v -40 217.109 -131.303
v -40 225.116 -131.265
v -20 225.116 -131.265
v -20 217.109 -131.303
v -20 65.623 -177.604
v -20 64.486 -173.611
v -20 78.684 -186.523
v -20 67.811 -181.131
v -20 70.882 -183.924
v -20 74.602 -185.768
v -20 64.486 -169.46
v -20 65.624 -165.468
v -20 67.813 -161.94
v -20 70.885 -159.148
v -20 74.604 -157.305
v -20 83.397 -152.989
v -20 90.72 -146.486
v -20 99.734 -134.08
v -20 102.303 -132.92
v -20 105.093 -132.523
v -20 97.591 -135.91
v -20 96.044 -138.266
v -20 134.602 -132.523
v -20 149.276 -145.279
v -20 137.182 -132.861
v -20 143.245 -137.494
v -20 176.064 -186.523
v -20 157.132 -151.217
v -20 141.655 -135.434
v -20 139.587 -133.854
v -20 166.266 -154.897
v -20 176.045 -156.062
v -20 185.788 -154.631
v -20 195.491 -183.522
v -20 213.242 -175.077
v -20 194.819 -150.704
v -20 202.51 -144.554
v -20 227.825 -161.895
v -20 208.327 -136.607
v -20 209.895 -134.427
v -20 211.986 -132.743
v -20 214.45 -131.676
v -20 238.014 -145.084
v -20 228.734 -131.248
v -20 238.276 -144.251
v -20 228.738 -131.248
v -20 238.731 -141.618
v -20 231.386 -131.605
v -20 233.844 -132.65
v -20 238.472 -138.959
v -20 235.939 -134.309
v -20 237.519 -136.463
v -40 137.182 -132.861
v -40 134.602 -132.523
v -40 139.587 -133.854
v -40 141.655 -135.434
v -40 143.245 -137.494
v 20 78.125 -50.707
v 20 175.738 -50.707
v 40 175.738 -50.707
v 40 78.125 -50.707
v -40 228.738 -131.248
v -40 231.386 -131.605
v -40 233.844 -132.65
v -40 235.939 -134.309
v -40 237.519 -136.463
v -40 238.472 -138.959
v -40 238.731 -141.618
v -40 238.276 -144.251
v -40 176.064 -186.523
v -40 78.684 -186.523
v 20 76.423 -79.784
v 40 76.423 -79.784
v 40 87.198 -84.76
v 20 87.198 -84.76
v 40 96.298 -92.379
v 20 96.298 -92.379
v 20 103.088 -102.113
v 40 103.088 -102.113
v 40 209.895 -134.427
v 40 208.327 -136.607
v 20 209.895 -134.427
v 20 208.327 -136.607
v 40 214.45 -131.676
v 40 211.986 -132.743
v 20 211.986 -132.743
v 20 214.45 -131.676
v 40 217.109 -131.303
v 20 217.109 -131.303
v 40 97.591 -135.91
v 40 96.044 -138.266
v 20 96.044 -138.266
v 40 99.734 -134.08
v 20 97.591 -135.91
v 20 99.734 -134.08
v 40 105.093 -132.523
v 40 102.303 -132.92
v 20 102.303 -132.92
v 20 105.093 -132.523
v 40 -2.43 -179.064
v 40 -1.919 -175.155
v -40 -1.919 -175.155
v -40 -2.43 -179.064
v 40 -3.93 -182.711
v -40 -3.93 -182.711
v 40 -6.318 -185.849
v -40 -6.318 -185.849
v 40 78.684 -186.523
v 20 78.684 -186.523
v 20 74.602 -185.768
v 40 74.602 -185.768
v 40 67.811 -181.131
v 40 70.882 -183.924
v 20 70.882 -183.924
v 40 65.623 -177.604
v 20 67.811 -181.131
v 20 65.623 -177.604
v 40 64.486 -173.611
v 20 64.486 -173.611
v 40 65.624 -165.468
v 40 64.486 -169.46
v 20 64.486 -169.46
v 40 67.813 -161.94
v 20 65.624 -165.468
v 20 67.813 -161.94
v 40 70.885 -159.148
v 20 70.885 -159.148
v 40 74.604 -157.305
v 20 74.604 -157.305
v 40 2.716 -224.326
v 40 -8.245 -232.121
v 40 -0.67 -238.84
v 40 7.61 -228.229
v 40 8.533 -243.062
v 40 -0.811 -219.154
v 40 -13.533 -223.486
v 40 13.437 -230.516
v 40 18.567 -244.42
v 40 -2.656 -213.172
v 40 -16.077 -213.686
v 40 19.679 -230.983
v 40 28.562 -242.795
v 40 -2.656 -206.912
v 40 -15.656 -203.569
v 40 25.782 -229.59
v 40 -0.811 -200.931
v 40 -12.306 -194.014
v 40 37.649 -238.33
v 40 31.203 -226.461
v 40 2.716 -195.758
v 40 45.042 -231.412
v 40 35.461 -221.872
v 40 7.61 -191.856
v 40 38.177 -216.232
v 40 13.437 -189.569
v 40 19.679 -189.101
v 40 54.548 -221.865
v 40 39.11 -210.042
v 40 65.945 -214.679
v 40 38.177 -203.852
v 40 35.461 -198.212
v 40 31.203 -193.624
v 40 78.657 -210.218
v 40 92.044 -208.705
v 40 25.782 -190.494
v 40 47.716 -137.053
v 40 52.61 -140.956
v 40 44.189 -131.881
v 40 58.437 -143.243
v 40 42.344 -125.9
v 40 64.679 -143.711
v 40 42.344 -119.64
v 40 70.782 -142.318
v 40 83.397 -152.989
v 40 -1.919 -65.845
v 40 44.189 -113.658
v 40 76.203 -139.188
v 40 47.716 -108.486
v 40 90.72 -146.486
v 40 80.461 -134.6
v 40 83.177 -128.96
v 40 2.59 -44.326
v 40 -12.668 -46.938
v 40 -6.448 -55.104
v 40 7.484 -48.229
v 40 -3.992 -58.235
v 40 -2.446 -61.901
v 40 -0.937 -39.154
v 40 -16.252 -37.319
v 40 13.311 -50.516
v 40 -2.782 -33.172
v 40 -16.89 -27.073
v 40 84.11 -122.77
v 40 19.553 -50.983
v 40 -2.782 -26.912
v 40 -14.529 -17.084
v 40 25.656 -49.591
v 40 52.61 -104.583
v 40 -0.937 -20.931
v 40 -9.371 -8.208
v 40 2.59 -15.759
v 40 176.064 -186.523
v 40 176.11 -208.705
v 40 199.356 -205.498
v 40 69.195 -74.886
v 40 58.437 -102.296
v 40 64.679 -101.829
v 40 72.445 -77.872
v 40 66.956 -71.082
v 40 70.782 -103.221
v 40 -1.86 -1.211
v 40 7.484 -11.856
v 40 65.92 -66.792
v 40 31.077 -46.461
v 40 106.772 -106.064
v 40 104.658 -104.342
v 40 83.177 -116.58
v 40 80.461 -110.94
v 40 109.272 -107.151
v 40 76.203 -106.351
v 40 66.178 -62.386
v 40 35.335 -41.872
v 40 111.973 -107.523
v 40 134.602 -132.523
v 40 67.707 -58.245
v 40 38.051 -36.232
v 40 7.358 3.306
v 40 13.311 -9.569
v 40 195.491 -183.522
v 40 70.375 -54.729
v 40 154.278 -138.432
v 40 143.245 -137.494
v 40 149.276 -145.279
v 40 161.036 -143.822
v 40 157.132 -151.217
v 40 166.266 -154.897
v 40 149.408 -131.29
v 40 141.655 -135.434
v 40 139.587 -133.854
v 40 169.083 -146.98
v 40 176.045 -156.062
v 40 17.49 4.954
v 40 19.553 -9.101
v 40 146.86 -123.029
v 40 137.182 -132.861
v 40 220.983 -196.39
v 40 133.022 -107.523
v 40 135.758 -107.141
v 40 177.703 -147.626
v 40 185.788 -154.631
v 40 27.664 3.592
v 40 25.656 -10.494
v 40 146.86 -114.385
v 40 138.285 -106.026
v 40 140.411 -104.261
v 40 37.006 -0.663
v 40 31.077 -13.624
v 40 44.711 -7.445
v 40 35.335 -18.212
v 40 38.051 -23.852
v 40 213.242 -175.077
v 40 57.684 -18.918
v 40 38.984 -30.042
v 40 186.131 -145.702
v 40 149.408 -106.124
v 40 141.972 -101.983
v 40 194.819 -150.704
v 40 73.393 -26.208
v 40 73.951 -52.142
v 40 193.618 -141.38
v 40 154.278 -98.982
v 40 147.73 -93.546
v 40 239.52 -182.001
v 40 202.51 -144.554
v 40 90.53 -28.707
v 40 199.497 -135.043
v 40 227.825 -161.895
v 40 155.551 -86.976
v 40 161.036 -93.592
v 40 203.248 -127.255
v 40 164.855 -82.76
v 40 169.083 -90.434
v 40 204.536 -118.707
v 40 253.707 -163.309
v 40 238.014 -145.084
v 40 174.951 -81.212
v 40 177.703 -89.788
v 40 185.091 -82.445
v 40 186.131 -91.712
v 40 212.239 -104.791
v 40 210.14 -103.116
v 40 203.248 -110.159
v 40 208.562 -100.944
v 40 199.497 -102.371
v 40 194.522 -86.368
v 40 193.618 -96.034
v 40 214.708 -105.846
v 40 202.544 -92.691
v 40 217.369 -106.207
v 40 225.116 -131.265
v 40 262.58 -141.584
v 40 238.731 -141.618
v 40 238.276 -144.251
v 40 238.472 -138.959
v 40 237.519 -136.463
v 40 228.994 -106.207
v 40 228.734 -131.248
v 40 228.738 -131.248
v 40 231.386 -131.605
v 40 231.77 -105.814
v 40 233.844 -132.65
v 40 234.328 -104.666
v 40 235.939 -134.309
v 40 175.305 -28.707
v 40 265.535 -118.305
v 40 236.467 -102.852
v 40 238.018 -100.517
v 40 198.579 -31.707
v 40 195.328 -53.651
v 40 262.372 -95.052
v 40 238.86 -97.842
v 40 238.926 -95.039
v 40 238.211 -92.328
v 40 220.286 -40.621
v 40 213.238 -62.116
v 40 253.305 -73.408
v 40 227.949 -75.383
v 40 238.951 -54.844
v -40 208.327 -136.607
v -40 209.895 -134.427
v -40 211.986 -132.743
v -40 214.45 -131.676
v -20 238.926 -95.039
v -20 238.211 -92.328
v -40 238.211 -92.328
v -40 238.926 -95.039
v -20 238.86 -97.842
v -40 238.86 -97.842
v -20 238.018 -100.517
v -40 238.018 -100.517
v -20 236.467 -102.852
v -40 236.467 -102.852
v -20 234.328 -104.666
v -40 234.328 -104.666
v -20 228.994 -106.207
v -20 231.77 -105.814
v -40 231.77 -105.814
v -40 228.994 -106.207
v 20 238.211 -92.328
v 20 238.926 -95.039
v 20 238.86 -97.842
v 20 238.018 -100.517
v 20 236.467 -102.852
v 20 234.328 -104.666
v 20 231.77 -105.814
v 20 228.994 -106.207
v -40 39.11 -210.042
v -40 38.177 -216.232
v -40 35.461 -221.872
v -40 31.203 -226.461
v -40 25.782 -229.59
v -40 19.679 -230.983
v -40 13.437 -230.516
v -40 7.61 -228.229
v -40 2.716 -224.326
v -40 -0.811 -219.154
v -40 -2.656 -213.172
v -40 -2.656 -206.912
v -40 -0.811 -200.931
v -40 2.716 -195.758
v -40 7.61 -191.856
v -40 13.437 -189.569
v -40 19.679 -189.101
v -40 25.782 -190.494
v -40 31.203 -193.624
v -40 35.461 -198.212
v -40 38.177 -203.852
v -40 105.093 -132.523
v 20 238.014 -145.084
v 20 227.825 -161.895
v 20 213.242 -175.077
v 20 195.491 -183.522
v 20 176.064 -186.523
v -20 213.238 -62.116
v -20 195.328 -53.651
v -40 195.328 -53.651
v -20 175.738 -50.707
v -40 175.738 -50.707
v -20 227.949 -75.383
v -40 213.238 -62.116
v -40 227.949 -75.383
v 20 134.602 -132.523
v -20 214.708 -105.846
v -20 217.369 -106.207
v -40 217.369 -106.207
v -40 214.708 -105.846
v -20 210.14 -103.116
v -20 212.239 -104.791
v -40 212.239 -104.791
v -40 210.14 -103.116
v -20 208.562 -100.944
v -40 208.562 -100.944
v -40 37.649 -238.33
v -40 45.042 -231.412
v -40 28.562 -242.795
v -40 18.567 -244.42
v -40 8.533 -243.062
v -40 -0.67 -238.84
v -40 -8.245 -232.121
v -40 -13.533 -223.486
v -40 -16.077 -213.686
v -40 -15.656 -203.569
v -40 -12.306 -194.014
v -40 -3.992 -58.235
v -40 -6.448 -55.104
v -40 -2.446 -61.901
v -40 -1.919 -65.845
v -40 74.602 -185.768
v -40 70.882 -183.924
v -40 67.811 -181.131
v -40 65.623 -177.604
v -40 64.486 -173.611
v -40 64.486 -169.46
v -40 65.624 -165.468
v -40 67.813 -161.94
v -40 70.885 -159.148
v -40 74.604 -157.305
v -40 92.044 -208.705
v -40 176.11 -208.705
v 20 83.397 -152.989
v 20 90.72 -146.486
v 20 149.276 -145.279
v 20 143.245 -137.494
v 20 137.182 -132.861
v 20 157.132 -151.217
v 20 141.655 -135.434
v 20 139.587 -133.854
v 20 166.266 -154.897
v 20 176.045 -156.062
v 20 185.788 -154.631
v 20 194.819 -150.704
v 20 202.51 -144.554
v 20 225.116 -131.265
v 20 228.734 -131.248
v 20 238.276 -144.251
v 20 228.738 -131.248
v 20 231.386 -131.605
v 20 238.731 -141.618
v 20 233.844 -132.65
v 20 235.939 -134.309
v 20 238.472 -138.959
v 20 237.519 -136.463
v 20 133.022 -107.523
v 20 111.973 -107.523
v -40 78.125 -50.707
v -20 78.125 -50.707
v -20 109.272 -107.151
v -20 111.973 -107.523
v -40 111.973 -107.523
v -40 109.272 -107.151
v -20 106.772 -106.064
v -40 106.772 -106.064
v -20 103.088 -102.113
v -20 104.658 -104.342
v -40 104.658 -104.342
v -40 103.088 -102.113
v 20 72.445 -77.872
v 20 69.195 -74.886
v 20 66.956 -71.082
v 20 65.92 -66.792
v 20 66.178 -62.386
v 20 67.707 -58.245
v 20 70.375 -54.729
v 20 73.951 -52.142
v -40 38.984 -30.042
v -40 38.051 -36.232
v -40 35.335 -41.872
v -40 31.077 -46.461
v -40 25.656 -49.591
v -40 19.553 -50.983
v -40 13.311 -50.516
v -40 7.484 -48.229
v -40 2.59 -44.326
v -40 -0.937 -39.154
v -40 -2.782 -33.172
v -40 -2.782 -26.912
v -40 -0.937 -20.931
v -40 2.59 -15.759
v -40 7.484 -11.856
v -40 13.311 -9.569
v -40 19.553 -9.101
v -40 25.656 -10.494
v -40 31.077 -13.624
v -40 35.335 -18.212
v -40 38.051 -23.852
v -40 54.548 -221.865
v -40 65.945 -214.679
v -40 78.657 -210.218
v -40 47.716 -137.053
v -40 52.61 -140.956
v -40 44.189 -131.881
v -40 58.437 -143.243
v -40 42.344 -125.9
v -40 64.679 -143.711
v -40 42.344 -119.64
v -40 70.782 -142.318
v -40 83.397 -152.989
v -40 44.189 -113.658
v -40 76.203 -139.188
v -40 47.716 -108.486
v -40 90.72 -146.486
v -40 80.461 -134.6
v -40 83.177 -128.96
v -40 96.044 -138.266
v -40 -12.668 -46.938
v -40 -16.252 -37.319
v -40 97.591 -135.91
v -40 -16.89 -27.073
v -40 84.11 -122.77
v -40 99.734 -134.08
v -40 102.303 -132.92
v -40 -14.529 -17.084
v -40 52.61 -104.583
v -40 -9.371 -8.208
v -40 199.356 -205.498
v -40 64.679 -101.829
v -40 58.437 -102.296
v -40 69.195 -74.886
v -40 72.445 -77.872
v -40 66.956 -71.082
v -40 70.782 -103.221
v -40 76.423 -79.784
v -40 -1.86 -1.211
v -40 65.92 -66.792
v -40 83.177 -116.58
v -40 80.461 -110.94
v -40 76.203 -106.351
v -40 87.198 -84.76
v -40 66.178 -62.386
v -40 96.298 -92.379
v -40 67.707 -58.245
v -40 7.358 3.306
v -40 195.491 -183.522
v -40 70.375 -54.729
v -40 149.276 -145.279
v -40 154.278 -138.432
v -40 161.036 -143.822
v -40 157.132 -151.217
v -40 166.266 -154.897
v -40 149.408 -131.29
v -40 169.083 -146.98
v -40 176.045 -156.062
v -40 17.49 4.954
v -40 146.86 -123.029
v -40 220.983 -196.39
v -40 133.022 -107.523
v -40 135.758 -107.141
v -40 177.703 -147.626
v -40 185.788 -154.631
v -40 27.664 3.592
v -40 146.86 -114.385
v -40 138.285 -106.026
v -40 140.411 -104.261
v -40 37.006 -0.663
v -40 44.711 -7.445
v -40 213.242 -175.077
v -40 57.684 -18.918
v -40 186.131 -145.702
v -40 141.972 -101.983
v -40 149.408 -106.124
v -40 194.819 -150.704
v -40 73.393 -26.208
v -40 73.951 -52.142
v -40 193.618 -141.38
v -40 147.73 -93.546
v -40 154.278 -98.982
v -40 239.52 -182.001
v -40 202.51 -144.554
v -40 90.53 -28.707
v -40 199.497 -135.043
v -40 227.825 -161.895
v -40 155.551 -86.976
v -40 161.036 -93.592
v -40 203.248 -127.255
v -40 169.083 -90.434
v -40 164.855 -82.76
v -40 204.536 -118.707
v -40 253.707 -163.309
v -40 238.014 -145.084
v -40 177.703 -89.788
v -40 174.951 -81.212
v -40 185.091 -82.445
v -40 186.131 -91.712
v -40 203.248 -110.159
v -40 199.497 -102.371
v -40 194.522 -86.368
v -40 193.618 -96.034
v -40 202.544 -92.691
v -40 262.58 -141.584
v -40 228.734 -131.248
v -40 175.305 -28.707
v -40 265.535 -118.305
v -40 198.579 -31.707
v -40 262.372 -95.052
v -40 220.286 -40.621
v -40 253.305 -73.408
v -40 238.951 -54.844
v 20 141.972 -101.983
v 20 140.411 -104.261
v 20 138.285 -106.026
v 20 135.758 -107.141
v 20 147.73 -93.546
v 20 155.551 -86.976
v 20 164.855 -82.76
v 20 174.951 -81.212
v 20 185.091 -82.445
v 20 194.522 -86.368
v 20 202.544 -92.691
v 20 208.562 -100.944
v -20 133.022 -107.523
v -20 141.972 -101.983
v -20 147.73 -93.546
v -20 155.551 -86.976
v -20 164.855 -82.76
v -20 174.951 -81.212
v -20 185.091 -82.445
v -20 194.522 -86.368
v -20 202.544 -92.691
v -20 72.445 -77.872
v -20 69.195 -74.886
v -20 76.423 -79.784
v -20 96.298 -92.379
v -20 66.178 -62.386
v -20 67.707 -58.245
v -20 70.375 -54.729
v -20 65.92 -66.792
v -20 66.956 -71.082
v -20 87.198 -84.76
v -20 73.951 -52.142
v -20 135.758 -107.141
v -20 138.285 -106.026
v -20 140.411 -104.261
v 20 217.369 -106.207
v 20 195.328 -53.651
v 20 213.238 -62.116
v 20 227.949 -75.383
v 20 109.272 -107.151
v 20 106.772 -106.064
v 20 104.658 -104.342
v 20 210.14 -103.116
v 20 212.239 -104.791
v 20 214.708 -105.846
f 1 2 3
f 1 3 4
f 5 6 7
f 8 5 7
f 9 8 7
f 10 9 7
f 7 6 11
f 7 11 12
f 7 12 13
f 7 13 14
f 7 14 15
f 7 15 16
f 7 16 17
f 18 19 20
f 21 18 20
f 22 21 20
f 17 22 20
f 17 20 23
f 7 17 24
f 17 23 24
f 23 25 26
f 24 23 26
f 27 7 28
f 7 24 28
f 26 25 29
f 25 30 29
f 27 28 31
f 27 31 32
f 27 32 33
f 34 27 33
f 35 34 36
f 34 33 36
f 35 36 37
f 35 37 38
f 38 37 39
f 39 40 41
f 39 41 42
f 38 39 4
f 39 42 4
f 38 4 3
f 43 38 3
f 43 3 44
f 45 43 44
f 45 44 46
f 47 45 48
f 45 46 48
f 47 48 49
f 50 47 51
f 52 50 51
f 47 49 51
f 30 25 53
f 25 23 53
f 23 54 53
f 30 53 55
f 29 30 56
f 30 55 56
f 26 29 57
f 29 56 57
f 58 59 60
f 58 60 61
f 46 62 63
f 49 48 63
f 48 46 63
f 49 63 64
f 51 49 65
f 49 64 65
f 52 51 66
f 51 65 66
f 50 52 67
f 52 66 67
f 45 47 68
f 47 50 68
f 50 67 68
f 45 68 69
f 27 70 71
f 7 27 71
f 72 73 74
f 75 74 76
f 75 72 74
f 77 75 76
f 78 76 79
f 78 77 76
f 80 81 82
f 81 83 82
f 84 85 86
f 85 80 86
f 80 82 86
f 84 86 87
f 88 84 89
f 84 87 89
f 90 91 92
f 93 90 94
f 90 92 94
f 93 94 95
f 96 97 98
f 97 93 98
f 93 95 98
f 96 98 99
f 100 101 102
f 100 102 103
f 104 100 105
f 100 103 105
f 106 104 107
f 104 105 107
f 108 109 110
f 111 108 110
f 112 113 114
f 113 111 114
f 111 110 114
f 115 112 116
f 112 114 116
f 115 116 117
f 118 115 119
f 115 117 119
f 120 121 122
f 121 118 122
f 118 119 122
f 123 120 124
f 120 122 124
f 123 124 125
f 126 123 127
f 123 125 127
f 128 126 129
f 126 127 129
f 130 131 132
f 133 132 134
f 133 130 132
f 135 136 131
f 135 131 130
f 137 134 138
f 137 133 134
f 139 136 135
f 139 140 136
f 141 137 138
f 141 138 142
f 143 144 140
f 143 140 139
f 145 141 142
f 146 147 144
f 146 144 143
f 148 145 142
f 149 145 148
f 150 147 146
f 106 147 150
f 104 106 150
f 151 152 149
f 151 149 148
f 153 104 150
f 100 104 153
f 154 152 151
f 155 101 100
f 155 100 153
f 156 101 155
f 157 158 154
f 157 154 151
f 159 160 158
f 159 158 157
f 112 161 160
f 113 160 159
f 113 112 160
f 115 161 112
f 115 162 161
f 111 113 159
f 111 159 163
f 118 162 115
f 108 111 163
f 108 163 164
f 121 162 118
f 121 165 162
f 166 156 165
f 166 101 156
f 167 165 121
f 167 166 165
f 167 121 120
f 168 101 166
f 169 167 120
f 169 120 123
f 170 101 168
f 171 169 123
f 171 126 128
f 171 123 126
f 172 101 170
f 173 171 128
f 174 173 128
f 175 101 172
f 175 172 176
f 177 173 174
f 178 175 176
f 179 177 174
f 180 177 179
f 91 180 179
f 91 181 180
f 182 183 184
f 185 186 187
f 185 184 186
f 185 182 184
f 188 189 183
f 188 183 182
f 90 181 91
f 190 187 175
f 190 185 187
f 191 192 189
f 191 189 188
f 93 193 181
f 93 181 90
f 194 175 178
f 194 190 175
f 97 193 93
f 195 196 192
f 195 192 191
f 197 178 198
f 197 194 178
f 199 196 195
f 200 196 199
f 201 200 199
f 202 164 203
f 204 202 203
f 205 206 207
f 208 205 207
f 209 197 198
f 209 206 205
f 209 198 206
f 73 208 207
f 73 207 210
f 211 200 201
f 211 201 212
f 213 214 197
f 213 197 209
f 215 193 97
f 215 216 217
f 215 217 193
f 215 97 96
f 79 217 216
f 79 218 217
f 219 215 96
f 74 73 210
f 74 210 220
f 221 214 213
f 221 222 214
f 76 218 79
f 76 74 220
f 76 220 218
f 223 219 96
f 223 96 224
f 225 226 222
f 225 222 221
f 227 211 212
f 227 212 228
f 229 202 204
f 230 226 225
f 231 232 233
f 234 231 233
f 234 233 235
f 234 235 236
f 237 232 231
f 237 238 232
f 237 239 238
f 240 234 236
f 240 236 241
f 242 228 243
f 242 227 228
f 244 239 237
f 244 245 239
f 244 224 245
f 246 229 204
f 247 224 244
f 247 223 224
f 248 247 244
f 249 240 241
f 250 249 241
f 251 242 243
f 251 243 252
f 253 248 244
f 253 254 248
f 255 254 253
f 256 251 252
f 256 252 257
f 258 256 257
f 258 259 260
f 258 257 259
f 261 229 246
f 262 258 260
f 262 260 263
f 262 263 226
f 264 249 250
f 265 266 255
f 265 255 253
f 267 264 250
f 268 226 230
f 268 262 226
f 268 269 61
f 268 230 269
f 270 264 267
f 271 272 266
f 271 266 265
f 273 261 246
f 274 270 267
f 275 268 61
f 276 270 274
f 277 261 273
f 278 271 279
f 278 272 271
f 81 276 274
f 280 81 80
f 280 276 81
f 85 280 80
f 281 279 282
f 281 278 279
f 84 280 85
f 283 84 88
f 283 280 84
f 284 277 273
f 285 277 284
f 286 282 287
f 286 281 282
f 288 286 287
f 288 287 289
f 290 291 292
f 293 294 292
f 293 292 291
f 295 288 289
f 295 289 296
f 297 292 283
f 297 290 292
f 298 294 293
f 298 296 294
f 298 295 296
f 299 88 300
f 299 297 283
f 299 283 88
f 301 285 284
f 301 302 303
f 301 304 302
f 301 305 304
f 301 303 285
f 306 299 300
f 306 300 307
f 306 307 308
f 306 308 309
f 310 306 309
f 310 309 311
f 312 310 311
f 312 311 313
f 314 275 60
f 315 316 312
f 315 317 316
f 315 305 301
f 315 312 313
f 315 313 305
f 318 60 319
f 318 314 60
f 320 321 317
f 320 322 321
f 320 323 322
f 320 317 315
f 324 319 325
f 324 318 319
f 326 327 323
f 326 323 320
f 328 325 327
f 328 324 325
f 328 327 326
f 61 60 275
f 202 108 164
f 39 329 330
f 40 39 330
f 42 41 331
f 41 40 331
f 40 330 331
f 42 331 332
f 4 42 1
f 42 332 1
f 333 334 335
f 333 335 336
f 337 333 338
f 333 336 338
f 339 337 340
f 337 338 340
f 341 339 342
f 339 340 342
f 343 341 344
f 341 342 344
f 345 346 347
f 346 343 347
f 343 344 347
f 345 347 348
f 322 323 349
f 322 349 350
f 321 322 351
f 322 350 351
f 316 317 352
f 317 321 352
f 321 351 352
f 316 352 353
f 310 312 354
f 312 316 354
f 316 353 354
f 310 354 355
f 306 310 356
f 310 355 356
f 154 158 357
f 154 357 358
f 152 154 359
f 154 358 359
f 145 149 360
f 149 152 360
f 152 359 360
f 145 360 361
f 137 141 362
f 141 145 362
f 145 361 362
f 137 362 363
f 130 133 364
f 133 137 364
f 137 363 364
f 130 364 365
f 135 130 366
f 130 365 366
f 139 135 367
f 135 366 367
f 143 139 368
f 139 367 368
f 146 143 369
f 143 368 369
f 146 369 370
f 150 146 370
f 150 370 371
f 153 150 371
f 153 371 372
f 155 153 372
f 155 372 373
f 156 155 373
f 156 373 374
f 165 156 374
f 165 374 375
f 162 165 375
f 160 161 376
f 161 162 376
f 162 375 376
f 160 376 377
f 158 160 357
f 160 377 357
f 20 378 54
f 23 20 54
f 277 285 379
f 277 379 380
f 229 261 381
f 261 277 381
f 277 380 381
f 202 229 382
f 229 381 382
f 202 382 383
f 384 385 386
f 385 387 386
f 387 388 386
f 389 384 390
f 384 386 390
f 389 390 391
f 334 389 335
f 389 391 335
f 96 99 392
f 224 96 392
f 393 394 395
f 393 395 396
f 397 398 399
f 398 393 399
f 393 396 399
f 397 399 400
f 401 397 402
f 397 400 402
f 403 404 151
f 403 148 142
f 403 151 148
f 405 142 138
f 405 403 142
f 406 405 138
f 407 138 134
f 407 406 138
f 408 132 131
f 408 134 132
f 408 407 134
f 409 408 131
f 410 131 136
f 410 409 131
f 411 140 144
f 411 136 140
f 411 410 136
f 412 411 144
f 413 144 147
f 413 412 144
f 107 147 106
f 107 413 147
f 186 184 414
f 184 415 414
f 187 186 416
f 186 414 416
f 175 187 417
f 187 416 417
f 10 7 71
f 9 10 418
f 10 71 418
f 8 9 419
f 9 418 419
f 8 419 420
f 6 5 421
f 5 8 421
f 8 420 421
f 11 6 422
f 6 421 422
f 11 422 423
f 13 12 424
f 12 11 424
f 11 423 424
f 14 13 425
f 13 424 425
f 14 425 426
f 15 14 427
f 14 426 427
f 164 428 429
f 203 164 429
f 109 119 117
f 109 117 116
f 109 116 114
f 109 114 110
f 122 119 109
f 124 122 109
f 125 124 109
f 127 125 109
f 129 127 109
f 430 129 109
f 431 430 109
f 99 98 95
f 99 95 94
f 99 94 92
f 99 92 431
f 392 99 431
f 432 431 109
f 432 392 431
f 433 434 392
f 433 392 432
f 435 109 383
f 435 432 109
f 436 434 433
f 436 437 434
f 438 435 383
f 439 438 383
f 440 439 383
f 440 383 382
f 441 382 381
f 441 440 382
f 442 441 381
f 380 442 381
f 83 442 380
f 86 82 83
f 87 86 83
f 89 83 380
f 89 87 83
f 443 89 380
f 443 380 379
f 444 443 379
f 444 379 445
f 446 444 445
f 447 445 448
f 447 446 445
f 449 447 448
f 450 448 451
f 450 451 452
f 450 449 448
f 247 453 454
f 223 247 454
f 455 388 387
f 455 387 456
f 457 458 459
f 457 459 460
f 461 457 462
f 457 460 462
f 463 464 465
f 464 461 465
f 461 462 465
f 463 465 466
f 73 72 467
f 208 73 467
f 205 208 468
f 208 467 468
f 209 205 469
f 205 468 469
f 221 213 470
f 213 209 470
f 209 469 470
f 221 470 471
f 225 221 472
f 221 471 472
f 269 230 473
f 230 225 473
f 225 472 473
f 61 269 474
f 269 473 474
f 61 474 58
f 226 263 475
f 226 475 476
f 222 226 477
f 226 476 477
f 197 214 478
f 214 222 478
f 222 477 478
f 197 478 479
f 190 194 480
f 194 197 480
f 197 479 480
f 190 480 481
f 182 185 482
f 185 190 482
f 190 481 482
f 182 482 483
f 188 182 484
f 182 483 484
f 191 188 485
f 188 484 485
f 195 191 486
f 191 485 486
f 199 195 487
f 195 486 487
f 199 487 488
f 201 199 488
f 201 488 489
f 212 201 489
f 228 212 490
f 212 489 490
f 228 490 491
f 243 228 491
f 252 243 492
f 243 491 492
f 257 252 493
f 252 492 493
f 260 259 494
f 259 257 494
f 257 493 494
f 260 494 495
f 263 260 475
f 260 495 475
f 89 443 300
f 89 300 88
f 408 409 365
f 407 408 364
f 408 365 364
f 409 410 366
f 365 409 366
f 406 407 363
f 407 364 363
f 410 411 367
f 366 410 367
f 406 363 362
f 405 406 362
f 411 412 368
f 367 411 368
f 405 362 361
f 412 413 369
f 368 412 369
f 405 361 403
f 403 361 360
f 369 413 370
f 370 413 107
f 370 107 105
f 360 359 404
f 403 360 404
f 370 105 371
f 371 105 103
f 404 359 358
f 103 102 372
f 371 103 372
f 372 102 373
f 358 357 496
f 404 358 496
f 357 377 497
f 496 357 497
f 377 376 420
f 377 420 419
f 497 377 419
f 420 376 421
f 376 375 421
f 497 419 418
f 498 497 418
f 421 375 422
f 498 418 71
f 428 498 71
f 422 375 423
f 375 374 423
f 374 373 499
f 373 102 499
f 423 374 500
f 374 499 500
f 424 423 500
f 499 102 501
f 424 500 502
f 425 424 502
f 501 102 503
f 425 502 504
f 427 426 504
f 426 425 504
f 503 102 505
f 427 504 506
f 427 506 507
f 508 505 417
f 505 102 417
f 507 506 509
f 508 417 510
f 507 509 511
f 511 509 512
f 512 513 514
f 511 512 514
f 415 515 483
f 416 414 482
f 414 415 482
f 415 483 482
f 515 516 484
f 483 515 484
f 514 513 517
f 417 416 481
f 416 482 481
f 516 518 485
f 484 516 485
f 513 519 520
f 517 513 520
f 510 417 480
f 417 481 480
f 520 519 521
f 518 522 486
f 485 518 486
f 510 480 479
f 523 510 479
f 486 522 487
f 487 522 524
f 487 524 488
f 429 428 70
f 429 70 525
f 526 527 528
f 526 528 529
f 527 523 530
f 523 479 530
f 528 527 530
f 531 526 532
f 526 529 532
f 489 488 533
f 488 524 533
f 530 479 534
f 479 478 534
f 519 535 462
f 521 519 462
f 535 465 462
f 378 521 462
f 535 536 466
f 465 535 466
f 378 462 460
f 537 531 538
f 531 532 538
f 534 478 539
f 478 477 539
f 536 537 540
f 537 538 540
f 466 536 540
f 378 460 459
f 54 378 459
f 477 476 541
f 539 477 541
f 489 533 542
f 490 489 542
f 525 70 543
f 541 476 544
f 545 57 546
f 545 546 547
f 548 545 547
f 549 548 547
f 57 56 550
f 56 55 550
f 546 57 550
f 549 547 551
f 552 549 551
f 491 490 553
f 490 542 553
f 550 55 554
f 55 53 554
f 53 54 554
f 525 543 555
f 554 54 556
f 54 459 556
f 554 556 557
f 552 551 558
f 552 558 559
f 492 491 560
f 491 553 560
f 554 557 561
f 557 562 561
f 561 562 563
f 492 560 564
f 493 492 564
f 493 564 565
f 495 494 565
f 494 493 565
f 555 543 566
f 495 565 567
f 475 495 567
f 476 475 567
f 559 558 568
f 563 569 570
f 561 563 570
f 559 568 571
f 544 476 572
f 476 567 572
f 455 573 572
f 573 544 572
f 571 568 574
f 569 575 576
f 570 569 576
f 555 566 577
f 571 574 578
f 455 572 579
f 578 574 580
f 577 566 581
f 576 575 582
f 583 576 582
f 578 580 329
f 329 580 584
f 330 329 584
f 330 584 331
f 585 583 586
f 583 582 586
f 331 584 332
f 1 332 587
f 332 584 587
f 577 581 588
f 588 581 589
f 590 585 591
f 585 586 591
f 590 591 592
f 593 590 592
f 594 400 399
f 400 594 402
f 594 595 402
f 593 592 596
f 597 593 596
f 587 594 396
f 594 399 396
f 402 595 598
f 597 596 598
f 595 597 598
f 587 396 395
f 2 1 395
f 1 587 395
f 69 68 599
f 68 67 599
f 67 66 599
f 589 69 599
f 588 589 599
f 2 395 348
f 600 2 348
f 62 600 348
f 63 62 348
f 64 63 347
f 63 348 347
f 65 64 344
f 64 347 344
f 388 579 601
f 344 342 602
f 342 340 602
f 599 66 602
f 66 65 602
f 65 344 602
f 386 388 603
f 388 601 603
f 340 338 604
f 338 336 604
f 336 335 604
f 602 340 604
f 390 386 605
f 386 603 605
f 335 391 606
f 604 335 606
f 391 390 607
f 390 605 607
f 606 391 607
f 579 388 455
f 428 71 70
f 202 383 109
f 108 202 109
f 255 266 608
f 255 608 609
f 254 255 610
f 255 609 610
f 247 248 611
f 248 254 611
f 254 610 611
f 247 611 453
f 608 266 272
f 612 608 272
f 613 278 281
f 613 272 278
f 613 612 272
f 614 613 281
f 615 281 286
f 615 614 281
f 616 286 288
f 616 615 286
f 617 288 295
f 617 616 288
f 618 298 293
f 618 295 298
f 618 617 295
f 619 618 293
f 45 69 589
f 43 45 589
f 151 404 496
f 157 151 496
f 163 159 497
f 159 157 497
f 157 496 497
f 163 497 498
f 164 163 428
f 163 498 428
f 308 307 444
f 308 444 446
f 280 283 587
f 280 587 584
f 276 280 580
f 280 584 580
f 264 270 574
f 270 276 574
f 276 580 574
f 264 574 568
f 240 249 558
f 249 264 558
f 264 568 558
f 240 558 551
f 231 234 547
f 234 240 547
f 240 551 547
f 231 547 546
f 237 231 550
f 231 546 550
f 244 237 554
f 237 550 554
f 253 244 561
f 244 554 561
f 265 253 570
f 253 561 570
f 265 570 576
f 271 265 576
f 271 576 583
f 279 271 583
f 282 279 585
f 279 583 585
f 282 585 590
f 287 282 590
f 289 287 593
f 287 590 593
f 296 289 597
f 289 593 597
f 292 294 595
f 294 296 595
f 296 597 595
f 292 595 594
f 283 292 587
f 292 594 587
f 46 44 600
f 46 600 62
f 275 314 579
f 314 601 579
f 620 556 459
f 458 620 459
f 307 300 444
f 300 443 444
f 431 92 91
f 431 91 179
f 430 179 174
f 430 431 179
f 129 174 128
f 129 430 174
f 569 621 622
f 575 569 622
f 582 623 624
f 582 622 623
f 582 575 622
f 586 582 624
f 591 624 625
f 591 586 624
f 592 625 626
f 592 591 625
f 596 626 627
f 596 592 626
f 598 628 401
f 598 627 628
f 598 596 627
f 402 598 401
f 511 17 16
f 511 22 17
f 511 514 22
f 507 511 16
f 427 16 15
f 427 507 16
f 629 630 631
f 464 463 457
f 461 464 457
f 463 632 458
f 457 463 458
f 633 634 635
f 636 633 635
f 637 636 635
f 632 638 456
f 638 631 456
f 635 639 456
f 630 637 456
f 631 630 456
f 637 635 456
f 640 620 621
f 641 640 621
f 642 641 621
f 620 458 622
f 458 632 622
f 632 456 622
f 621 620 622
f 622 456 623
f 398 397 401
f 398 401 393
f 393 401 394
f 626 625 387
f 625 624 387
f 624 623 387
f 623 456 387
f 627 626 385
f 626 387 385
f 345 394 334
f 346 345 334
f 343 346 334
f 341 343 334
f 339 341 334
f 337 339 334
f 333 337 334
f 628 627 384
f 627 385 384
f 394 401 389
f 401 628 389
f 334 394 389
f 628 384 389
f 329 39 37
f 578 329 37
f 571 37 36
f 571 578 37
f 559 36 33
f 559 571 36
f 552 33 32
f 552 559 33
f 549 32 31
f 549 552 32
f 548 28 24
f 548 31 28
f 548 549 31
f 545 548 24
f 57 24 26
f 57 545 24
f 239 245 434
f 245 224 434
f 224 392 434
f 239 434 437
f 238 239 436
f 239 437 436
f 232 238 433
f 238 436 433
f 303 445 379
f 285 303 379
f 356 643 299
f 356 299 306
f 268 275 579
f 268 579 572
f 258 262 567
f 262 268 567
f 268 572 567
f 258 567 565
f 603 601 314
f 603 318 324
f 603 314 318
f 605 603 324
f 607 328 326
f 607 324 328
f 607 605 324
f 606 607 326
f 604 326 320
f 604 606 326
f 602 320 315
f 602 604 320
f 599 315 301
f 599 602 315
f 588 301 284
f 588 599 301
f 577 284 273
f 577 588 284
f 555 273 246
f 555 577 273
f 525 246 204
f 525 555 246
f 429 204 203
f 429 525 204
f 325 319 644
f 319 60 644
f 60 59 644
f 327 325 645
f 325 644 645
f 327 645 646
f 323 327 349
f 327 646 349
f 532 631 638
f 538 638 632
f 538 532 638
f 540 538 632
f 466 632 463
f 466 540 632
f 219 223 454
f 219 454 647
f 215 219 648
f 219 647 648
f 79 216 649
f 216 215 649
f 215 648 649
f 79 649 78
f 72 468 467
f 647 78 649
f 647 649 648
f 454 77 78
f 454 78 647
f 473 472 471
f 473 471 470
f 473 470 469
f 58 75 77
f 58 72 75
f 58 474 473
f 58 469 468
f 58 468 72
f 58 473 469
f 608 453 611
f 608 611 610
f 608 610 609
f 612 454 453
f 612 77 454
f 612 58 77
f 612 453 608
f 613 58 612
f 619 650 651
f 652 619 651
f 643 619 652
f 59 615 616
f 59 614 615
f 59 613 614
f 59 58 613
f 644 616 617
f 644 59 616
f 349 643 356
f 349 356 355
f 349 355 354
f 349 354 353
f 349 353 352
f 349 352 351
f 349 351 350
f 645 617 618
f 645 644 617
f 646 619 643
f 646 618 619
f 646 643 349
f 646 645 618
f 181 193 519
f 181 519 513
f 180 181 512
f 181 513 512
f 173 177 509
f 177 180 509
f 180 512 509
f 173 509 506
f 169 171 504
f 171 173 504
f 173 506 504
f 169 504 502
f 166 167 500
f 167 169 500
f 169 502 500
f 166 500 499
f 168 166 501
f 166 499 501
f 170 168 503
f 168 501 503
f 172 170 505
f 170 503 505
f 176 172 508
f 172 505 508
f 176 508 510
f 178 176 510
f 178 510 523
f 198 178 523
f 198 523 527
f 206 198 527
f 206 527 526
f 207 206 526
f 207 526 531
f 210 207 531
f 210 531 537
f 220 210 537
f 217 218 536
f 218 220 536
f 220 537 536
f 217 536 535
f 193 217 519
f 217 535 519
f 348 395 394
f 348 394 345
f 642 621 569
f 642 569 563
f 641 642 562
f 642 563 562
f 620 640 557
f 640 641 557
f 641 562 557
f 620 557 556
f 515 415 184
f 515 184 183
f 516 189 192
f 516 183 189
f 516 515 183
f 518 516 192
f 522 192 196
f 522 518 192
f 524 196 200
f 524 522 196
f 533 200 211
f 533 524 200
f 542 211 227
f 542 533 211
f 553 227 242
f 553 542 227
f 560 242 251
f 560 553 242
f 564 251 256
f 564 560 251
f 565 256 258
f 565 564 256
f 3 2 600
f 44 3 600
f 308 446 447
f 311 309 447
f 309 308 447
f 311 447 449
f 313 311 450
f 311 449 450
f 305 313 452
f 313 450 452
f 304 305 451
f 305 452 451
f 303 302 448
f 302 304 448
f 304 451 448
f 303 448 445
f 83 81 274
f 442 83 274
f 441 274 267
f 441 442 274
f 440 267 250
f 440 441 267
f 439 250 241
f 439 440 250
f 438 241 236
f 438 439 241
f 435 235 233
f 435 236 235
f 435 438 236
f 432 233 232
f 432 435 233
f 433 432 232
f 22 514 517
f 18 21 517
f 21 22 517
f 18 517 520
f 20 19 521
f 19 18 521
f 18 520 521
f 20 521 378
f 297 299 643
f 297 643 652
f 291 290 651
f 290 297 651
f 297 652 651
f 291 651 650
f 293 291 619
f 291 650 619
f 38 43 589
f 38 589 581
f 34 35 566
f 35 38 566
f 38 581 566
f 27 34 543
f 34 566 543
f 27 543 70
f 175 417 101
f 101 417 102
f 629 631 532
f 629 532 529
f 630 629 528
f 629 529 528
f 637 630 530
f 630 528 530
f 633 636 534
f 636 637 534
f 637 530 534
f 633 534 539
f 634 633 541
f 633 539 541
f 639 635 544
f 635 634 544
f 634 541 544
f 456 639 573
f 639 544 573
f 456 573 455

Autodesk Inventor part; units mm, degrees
ref_plane "YZ Plane" through (0, 0, 0) normal (1, 0, 0) x (0, 1, 0)
ref_plane "XZ Plane" through (0, 0, 0) normal (0, 1, 0) x (-1, 0, 0)
ref_plane "XY Plane" through (0, 0, 0) normal (0, 0, 1) x (1, 0, 0)
sketch "Sketch1" plane through (0, 0, 0) normal (1, 0, 0) x (0, 1, 0)
  arc A0 (176.1097, -208.7052) -> (175.3048, -28.7073) centre (175.5363, -118.707) ccw
  line L0 (175.3048, -28.7073) -> (90.5303, -28.7073)
  line L1 (-1.9186, -65.845) -> (-1.9186, -175.1547)
  line L2 (92.0444, -208.7052) -> (176.1097, -208.7052)
  arc A1 (44.7113, -7.4451) -> (-6.4479, -55.1041) centre (17.9836, -30.0422) ccw
  arc A2 (-6.3181, -185.8489) -> (45.0423, -231.4117) centre (18.1097, -210.0421) ccw
  line L3 (175.7375, -50.7073) -> (78.1247, -50.7073)
  line L4 (133.0218, -107.5228) -> (111.9726, -107.5228)
  line L5 (105.0926, -132.5228) -> (134.6019, -132.5228)
  arc A3 (208.5623, -100.9438) -> (141.9722, -101.9826) centre (175.5363, -118.707) ccw
  arc A4 (103.0885, -102.1131) -> (76.4229, -79.7842) centre (63.1097, -122.7698) ccw
  arc A5 (74.6044, -157.3047) -> (96.0441, -138.2655) centre (63.1097, -122.7698) ccw
  circle A6 centre (63.1097, -122.7698) radius 21
  circle A7 centre (17.9836, -30.0422) radius 21
  circle A8 centre (18.1097, -210.0421) radius 21
  arc A9 (44.7113, -7.4451) -> (90.5303, -28.7073) centre (90.5303, 31.2927) ccw
  arc A10 (92.0444, -208.7052) -> (45.0423, -231.4117) centre (92.0444, -268.7052) ccw
  arc A11 (-1.9186, -65.845) -> (-6.4479, -55.1041) centre (-16.9186, -65.845) ccw
  arc A12 (-6.3181, -185.8489) -> (-1.9186, -175.1547) centre (-17.1159, -175.1547) ccw
  arc A13 (78.1247, -50.7073) -> (76.4229, -79.7842) centre (80.8606, -65.4557) ccw
  arc A14 (74.6044, -157.3047) -> (78.6837, -186.5226) centre (79.3415, -171.5371) ccw
  circle A15 centre (175.5363, -118.707) radius 29
  arc A16 (133.0218, -107.5228) -> (141.9722, -101.9826) centre (133.0218, -97.5228) ccw
  arc A17 (143.2454, -137.4939) -> (134.6019, -132.5228) centre (134.6019, -142.5228) ccw
  arc A18 (103.0885, -102.1131) -> (111.9726, -107.5228) centre (111.9726, -97.5228) ccw
  arc A19 (105.0926, -132.5228) -> (96.0441, -138.2655) centre (105.0926, -142.5228) ccw
  line L6 (217.3693, -106.207) -> (225.3783, -106.207)
  line L7 (225.3783, -106.207) -> (229.2504, -106.207)
  line L8 (225.1161, -131.2646) -> (228.7337, -131.2481)
  line L9 (228.7337, -131.2481) -> (217.1089, -131.3029)
  arc A20 (217.1089, -131.3029) -> (208.3269, -136.6074) centre (217.156, -141.3028) ccw
  arc A21 (208.5623, -100.9438) -> (217.3693, -106.207) centre (217.3693, -96.207) ccw
  line L10 (119.8472, -132.5228) -> (119.8472, -186.8276)
  arc A22 (176.0639, -186.5226) -> (238.0141, -145.0843) centre (175.5363, -118.707) ccw
  arc A23 (143.2454, -137.4939) -> (208.3269, -136.6074) centre (175.5363, -118.707) ccw
  line L11 (176.0639, -186.5226) -> (78.6837, -186.5226)
  arc A24 (238.2111, -92.3277) -> (175.7375, -50.7073) centre (175.5363, -118.707) ccw
  line L12 (229.2504, -106.207) -> (228.9942, -106.207)
  arc A25 (228.9942, -106.207) -> (238.2111, -92.3277) centre (228.9942, -96.207) ccw
  line L13 (228.7337, -131.2481) -> (228.7379, -131.2481)
  line L14 (238.2764, -144.2509) -> (238.0141, -145.0843)
  arc A26 (238.2764, -144.2509) -> (228.7379, -131.2481) centre (228.7379, -141.2481) ccw
  point P0 (0, 0)
  point P1 (0, 0)
  point P2 (-1.9186, -182.0976)
  point P3 (139.7429, -107.5228)
  point P4 (140.8602, -132.5228)
  point P5 (105.4479, -107.5228)
  point P6 (98.1763, -132.5228)
  point P7 (-1.9186, -58.8329)
  point P8 (210.8916, -106.207)
  point P9 (242.3775, -106.207)
  dimension "d36" = 60
  dimension "d37" = 42
  dimension "d38" = 35
  dimension "d40" = 42
  dimension "d41" = 45
  dimension "d42" = 45
  dimension "d50" = 90
  dimension "d51" = 15
  dimension "d52" = 15
  dimension "d53" = 15
  dimension "d54" = 180
  dimension "d55" = 60
  dimension "d64" = 58
  dimension "d66" = 25
  dimension "d68" = 10
  dimension "d69" = 37.5
  dimension "d75" = 22
  dimension "d79" = 10
extrude "Extrusion1" add sketch "Sketch1" along normal blind 40 and the other way blind 40
sketch "Sketch2" plane through (40, 0, 0) normal (1, 0, 0) x (0, 0, -1)
  point P0 (0, 0)
extrude "Extrusion2" add sketch "Sketch1" along normal blind 20 and the other way blind 20 contours A24 A25 L7 L6 A21 A3 A16 L4 A18 A4 A13 L3 | L5 L10 L11 A14 A5 A19 | L5 A17 A23 A20 L9 L8 L13 A26 L14 A22 L11 L10
properties part number "hw1"
